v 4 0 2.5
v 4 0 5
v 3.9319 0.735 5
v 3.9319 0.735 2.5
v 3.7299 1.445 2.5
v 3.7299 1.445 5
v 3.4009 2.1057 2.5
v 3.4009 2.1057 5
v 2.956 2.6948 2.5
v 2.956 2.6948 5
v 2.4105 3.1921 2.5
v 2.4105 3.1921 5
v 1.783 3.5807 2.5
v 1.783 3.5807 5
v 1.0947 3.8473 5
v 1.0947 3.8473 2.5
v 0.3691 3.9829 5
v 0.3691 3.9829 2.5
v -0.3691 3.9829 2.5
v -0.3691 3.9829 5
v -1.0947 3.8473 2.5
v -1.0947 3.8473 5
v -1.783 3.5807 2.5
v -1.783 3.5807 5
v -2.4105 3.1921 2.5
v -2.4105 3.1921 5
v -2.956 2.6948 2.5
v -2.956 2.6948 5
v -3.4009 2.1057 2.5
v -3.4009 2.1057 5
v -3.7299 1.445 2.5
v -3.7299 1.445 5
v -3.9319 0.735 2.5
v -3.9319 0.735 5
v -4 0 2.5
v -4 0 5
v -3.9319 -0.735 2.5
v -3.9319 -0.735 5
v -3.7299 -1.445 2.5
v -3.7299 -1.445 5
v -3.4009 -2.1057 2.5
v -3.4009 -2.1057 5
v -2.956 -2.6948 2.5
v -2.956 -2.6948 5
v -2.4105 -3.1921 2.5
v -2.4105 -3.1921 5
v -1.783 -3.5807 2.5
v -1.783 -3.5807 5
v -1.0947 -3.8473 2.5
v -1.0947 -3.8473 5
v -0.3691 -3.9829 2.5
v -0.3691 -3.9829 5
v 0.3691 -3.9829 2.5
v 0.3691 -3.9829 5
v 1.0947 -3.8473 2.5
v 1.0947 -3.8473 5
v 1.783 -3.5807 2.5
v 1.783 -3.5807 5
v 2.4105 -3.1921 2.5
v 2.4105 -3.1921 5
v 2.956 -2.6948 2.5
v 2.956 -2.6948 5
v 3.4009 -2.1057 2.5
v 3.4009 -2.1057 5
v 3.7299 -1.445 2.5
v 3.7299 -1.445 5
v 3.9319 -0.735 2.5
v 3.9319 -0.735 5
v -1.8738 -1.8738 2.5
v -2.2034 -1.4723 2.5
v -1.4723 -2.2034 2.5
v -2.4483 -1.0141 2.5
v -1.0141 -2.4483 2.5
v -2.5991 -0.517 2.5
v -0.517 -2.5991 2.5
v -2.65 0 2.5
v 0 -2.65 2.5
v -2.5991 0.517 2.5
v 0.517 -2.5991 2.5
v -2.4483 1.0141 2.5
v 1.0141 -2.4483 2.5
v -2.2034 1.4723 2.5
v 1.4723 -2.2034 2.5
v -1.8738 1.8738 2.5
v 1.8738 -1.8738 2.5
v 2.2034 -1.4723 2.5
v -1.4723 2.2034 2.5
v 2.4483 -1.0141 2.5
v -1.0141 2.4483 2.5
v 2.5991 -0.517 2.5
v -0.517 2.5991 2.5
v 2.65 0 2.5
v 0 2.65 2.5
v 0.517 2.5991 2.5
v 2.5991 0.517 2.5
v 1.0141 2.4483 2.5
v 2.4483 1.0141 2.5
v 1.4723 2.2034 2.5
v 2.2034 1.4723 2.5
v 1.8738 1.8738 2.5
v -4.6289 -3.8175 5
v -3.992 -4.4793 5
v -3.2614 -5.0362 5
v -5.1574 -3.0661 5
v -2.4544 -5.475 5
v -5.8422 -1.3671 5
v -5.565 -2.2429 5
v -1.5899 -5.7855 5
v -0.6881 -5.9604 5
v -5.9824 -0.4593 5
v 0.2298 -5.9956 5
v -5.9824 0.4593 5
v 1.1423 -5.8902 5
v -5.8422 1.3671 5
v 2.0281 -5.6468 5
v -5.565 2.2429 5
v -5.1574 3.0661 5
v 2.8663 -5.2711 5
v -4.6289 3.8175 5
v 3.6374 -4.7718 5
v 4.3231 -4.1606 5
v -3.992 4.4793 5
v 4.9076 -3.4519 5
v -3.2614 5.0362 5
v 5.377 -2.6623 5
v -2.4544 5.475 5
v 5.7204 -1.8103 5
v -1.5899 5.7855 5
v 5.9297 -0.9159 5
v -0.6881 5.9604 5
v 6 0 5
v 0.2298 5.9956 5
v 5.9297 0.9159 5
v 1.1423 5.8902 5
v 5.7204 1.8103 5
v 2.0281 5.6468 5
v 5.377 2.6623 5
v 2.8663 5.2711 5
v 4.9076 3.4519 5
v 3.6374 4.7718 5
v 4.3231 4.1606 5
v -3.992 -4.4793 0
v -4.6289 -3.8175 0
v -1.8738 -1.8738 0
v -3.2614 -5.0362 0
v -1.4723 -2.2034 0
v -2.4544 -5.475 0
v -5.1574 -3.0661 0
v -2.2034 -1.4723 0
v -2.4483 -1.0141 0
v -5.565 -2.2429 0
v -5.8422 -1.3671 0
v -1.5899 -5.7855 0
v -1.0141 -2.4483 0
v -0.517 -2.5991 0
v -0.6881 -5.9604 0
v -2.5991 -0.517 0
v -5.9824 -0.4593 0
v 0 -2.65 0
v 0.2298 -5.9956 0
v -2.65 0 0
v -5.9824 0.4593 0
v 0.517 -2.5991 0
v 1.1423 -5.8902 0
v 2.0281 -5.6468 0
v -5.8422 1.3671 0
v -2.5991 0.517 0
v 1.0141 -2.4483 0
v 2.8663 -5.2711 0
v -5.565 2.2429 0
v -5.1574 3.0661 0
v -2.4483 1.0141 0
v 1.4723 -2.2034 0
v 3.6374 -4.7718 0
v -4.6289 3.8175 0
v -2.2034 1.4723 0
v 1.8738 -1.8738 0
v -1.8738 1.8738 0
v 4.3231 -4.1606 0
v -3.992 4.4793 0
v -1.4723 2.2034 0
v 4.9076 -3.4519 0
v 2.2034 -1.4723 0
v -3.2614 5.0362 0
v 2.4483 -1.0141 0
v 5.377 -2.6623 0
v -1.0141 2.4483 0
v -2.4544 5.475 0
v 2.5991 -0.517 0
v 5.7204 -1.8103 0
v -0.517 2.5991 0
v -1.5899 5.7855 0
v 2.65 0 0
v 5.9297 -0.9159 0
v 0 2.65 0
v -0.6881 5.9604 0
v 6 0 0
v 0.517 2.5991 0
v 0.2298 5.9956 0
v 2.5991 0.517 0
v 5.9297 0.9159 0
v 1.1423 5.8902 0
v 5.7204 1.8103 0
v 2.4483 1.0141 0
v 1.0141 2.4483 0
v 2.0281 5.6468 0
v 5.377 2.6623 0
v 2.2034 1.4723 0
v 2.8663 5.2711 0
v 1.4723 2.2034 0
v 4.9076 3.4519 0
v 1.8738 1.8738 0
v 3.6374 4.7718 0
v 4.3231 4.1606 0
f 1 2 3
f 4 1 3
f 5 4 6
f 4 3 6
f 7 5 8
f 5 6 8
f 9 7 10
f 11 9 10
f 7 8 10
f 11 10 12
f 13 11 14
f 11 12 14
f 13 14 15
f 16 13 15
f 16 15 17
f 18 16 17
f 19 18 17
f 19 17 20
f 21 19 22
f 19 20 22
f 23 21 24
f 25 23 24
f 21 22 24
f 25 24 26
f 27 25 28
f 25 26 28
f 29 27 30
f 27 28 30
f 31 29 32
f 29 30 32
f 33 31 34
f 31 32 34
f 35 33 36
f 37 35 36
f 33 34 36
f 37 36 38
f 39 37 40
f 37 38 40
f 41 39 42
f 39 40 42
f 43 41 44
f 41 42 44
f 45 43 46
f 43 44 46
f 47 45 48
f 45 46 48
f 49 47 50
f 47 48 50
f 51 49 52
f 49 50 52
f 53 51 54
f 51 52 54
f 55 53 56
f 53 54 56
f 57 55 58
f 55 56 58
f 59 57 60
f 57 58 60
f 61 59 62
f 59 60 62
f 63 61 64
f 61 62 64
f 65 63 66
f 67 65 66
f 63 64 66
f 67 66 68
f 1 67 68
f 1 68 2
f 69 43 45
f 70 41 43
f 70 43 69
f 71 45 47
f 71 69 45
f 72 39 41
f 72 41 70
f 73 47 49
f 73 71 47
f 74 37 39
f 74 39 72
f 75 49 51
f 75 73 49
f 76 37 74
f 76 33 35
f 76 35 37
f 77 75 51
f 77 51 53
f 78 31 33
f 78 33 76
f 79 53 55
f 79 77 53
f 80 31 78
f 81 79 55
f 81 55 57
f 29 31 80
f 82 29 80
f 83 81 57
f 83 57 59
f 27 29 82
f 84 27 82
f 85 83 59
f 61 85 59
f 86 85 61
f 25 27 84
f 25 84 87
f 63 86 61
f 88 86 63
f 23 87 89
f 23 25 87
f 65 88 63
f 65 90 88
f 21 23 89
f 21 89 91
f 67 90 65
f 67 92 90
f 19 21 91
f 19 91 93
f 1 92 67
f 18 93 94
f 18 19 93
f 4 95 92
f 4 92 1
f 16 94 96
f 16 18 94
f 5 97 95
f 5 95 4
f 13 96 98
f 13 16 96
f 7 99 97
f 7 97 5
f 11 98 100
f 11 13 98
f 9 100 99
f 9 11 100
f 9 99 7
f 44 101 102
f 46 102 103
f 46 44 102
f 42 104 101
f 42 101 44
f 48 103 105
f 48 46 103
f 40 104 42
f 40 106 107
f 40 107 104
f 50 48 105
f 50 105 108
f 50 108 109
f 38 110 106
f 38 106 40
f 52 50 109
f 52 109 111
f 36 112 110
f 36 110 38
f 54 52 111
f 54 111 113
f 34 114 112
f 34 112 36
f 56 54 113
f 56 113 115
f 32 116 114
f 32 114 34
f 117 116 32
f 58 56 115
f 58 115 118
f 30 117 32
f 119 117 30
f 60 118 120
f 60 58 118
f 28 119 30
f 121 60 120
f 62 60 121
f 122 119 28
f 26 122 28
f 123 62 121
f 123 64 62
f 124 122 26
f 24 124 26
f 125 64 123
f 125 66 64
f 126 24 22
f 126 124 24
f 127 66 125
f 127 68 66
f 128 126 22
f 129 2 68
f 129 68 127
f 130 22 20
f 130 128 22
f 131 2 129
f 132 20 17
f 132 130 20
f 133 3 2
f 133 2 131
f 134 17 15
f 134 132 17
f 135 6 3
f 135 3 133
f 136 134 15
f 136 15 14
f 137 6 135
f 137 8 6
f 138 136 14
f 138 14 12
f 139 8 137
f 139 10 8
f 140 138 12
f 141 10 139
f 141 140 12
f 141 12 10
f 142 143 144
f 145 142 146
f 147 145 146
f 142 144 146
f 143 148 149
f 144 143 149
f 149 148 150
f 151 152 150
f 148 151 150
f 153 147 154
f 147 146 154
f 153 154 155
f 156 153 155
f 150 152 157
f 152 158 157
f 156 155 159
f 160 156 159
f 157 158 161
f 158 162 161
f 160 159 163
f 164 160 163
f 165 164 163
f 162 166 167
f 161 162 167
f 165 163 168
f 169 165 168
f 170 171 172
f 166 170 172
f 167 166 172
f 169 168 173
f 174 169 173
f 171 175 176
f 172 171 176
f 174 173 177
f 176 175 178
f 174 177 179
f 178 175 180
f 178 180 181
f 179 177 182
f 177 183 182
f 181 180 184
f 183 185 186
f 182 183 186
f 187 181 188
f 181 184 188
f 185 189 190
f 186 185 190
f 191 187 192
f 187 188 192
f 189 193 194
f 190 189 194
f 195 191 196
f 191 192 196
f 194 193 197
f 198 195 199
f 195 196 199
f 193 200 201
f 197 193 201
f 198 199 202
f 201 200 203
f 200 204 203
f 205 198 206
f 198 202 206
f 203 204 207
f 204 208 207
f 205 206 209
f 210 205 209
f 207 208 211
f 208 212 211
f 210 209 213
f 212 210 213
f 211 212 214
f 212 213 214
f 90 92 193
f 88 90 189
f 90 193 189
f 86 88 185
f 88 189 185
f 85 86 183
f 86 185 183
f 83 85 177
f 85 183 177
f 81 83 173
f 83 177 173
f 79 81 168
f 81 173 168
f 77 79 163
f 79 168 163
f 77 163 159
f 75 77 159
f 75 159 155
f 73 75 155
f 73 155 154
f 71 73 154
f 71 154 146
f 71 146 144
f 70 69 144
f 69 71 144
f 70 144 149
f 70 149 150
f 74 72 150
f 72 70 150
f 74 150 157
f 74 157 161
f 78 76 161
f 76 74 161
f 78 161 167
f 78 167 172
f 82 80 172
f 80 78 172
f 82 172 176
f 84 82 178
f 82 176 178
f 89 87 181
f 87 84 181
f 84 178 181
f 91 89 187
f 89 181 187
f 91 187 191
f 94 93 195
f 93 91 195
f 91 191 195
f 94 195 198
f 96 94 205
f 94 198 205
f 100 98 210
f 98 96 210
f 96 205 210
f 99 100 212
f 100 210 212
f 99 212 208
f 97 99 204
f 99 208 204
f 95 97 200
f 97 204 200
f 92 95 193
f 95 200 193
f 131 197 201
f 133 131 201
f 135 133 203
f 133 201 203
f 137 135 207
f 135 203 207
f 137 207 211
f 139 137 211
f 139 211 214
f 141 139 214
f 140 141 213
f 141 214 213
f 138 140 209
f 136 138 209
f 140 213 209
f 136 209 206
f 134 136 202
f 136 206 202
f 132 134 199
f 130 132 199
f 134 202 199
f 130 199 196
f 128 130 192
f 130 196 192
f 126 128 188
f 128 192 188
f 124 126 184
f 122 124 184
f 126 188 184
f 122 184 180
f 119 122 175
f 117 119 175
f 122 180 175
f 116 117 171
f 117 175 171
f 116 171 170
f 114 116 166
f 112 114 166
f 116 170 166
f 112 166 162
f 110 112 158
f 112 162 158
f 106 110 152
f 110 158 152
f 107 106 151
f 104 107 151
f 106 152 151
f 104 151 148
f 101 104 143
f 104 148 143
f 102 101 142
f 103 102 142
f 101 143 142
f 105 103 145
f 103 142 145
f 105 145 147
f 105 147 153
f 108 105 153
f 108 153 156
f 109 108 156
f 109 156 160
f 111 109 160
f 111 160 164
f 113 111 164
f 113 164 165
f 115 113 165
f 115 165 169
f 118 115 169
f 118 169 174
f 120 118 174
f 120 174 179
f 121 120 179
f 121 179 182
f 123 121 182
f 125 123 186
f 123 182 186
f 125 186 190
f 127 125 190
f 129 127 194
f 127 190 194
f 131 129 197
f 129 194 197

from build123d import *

# Parameters (mm, degrees)
F0_R     = 6
F0_R_2   = 2.65
F1_DEPTH = 5
F2_R     = 2.65
F3_DEPTH = 25
F4_R     = 4
F4_R_2   = 2.65
F5_DEPTH = 2.5


with BuildPart() as f1:
    # F0 (on Top) → F1 (new body)
    with BuildSketch(Plane.XY):
        Circle(F0_R)
        Circle(F0_R_2, mode=Mode.SUBTRACT)
        Circle(F0_R_2)
    extrude(amount=F1_DEPTH)

    # F2 (on face) → F3 (cut)
    with BuildSketch(Plane(origin=(0, 0, 0), x_dir=(1, 0, 0), z_dir=(0, 0, -1))):
        Circle(F2_R)
    extrude(amount=-F3_DEPTH, mode=Mode.SUBTRACT)

    # F4 (on face) → F5 (cut)
    with BuildSketch(Plane.XY.offset(5)):
        Circle(F4_R)
        Circle(F4_R_2, mode=Mode.SUBTRACT)
    extrude(amount=-F5_DEPTH, mode=Mode.SUBTRACT)


solid = f1.part
